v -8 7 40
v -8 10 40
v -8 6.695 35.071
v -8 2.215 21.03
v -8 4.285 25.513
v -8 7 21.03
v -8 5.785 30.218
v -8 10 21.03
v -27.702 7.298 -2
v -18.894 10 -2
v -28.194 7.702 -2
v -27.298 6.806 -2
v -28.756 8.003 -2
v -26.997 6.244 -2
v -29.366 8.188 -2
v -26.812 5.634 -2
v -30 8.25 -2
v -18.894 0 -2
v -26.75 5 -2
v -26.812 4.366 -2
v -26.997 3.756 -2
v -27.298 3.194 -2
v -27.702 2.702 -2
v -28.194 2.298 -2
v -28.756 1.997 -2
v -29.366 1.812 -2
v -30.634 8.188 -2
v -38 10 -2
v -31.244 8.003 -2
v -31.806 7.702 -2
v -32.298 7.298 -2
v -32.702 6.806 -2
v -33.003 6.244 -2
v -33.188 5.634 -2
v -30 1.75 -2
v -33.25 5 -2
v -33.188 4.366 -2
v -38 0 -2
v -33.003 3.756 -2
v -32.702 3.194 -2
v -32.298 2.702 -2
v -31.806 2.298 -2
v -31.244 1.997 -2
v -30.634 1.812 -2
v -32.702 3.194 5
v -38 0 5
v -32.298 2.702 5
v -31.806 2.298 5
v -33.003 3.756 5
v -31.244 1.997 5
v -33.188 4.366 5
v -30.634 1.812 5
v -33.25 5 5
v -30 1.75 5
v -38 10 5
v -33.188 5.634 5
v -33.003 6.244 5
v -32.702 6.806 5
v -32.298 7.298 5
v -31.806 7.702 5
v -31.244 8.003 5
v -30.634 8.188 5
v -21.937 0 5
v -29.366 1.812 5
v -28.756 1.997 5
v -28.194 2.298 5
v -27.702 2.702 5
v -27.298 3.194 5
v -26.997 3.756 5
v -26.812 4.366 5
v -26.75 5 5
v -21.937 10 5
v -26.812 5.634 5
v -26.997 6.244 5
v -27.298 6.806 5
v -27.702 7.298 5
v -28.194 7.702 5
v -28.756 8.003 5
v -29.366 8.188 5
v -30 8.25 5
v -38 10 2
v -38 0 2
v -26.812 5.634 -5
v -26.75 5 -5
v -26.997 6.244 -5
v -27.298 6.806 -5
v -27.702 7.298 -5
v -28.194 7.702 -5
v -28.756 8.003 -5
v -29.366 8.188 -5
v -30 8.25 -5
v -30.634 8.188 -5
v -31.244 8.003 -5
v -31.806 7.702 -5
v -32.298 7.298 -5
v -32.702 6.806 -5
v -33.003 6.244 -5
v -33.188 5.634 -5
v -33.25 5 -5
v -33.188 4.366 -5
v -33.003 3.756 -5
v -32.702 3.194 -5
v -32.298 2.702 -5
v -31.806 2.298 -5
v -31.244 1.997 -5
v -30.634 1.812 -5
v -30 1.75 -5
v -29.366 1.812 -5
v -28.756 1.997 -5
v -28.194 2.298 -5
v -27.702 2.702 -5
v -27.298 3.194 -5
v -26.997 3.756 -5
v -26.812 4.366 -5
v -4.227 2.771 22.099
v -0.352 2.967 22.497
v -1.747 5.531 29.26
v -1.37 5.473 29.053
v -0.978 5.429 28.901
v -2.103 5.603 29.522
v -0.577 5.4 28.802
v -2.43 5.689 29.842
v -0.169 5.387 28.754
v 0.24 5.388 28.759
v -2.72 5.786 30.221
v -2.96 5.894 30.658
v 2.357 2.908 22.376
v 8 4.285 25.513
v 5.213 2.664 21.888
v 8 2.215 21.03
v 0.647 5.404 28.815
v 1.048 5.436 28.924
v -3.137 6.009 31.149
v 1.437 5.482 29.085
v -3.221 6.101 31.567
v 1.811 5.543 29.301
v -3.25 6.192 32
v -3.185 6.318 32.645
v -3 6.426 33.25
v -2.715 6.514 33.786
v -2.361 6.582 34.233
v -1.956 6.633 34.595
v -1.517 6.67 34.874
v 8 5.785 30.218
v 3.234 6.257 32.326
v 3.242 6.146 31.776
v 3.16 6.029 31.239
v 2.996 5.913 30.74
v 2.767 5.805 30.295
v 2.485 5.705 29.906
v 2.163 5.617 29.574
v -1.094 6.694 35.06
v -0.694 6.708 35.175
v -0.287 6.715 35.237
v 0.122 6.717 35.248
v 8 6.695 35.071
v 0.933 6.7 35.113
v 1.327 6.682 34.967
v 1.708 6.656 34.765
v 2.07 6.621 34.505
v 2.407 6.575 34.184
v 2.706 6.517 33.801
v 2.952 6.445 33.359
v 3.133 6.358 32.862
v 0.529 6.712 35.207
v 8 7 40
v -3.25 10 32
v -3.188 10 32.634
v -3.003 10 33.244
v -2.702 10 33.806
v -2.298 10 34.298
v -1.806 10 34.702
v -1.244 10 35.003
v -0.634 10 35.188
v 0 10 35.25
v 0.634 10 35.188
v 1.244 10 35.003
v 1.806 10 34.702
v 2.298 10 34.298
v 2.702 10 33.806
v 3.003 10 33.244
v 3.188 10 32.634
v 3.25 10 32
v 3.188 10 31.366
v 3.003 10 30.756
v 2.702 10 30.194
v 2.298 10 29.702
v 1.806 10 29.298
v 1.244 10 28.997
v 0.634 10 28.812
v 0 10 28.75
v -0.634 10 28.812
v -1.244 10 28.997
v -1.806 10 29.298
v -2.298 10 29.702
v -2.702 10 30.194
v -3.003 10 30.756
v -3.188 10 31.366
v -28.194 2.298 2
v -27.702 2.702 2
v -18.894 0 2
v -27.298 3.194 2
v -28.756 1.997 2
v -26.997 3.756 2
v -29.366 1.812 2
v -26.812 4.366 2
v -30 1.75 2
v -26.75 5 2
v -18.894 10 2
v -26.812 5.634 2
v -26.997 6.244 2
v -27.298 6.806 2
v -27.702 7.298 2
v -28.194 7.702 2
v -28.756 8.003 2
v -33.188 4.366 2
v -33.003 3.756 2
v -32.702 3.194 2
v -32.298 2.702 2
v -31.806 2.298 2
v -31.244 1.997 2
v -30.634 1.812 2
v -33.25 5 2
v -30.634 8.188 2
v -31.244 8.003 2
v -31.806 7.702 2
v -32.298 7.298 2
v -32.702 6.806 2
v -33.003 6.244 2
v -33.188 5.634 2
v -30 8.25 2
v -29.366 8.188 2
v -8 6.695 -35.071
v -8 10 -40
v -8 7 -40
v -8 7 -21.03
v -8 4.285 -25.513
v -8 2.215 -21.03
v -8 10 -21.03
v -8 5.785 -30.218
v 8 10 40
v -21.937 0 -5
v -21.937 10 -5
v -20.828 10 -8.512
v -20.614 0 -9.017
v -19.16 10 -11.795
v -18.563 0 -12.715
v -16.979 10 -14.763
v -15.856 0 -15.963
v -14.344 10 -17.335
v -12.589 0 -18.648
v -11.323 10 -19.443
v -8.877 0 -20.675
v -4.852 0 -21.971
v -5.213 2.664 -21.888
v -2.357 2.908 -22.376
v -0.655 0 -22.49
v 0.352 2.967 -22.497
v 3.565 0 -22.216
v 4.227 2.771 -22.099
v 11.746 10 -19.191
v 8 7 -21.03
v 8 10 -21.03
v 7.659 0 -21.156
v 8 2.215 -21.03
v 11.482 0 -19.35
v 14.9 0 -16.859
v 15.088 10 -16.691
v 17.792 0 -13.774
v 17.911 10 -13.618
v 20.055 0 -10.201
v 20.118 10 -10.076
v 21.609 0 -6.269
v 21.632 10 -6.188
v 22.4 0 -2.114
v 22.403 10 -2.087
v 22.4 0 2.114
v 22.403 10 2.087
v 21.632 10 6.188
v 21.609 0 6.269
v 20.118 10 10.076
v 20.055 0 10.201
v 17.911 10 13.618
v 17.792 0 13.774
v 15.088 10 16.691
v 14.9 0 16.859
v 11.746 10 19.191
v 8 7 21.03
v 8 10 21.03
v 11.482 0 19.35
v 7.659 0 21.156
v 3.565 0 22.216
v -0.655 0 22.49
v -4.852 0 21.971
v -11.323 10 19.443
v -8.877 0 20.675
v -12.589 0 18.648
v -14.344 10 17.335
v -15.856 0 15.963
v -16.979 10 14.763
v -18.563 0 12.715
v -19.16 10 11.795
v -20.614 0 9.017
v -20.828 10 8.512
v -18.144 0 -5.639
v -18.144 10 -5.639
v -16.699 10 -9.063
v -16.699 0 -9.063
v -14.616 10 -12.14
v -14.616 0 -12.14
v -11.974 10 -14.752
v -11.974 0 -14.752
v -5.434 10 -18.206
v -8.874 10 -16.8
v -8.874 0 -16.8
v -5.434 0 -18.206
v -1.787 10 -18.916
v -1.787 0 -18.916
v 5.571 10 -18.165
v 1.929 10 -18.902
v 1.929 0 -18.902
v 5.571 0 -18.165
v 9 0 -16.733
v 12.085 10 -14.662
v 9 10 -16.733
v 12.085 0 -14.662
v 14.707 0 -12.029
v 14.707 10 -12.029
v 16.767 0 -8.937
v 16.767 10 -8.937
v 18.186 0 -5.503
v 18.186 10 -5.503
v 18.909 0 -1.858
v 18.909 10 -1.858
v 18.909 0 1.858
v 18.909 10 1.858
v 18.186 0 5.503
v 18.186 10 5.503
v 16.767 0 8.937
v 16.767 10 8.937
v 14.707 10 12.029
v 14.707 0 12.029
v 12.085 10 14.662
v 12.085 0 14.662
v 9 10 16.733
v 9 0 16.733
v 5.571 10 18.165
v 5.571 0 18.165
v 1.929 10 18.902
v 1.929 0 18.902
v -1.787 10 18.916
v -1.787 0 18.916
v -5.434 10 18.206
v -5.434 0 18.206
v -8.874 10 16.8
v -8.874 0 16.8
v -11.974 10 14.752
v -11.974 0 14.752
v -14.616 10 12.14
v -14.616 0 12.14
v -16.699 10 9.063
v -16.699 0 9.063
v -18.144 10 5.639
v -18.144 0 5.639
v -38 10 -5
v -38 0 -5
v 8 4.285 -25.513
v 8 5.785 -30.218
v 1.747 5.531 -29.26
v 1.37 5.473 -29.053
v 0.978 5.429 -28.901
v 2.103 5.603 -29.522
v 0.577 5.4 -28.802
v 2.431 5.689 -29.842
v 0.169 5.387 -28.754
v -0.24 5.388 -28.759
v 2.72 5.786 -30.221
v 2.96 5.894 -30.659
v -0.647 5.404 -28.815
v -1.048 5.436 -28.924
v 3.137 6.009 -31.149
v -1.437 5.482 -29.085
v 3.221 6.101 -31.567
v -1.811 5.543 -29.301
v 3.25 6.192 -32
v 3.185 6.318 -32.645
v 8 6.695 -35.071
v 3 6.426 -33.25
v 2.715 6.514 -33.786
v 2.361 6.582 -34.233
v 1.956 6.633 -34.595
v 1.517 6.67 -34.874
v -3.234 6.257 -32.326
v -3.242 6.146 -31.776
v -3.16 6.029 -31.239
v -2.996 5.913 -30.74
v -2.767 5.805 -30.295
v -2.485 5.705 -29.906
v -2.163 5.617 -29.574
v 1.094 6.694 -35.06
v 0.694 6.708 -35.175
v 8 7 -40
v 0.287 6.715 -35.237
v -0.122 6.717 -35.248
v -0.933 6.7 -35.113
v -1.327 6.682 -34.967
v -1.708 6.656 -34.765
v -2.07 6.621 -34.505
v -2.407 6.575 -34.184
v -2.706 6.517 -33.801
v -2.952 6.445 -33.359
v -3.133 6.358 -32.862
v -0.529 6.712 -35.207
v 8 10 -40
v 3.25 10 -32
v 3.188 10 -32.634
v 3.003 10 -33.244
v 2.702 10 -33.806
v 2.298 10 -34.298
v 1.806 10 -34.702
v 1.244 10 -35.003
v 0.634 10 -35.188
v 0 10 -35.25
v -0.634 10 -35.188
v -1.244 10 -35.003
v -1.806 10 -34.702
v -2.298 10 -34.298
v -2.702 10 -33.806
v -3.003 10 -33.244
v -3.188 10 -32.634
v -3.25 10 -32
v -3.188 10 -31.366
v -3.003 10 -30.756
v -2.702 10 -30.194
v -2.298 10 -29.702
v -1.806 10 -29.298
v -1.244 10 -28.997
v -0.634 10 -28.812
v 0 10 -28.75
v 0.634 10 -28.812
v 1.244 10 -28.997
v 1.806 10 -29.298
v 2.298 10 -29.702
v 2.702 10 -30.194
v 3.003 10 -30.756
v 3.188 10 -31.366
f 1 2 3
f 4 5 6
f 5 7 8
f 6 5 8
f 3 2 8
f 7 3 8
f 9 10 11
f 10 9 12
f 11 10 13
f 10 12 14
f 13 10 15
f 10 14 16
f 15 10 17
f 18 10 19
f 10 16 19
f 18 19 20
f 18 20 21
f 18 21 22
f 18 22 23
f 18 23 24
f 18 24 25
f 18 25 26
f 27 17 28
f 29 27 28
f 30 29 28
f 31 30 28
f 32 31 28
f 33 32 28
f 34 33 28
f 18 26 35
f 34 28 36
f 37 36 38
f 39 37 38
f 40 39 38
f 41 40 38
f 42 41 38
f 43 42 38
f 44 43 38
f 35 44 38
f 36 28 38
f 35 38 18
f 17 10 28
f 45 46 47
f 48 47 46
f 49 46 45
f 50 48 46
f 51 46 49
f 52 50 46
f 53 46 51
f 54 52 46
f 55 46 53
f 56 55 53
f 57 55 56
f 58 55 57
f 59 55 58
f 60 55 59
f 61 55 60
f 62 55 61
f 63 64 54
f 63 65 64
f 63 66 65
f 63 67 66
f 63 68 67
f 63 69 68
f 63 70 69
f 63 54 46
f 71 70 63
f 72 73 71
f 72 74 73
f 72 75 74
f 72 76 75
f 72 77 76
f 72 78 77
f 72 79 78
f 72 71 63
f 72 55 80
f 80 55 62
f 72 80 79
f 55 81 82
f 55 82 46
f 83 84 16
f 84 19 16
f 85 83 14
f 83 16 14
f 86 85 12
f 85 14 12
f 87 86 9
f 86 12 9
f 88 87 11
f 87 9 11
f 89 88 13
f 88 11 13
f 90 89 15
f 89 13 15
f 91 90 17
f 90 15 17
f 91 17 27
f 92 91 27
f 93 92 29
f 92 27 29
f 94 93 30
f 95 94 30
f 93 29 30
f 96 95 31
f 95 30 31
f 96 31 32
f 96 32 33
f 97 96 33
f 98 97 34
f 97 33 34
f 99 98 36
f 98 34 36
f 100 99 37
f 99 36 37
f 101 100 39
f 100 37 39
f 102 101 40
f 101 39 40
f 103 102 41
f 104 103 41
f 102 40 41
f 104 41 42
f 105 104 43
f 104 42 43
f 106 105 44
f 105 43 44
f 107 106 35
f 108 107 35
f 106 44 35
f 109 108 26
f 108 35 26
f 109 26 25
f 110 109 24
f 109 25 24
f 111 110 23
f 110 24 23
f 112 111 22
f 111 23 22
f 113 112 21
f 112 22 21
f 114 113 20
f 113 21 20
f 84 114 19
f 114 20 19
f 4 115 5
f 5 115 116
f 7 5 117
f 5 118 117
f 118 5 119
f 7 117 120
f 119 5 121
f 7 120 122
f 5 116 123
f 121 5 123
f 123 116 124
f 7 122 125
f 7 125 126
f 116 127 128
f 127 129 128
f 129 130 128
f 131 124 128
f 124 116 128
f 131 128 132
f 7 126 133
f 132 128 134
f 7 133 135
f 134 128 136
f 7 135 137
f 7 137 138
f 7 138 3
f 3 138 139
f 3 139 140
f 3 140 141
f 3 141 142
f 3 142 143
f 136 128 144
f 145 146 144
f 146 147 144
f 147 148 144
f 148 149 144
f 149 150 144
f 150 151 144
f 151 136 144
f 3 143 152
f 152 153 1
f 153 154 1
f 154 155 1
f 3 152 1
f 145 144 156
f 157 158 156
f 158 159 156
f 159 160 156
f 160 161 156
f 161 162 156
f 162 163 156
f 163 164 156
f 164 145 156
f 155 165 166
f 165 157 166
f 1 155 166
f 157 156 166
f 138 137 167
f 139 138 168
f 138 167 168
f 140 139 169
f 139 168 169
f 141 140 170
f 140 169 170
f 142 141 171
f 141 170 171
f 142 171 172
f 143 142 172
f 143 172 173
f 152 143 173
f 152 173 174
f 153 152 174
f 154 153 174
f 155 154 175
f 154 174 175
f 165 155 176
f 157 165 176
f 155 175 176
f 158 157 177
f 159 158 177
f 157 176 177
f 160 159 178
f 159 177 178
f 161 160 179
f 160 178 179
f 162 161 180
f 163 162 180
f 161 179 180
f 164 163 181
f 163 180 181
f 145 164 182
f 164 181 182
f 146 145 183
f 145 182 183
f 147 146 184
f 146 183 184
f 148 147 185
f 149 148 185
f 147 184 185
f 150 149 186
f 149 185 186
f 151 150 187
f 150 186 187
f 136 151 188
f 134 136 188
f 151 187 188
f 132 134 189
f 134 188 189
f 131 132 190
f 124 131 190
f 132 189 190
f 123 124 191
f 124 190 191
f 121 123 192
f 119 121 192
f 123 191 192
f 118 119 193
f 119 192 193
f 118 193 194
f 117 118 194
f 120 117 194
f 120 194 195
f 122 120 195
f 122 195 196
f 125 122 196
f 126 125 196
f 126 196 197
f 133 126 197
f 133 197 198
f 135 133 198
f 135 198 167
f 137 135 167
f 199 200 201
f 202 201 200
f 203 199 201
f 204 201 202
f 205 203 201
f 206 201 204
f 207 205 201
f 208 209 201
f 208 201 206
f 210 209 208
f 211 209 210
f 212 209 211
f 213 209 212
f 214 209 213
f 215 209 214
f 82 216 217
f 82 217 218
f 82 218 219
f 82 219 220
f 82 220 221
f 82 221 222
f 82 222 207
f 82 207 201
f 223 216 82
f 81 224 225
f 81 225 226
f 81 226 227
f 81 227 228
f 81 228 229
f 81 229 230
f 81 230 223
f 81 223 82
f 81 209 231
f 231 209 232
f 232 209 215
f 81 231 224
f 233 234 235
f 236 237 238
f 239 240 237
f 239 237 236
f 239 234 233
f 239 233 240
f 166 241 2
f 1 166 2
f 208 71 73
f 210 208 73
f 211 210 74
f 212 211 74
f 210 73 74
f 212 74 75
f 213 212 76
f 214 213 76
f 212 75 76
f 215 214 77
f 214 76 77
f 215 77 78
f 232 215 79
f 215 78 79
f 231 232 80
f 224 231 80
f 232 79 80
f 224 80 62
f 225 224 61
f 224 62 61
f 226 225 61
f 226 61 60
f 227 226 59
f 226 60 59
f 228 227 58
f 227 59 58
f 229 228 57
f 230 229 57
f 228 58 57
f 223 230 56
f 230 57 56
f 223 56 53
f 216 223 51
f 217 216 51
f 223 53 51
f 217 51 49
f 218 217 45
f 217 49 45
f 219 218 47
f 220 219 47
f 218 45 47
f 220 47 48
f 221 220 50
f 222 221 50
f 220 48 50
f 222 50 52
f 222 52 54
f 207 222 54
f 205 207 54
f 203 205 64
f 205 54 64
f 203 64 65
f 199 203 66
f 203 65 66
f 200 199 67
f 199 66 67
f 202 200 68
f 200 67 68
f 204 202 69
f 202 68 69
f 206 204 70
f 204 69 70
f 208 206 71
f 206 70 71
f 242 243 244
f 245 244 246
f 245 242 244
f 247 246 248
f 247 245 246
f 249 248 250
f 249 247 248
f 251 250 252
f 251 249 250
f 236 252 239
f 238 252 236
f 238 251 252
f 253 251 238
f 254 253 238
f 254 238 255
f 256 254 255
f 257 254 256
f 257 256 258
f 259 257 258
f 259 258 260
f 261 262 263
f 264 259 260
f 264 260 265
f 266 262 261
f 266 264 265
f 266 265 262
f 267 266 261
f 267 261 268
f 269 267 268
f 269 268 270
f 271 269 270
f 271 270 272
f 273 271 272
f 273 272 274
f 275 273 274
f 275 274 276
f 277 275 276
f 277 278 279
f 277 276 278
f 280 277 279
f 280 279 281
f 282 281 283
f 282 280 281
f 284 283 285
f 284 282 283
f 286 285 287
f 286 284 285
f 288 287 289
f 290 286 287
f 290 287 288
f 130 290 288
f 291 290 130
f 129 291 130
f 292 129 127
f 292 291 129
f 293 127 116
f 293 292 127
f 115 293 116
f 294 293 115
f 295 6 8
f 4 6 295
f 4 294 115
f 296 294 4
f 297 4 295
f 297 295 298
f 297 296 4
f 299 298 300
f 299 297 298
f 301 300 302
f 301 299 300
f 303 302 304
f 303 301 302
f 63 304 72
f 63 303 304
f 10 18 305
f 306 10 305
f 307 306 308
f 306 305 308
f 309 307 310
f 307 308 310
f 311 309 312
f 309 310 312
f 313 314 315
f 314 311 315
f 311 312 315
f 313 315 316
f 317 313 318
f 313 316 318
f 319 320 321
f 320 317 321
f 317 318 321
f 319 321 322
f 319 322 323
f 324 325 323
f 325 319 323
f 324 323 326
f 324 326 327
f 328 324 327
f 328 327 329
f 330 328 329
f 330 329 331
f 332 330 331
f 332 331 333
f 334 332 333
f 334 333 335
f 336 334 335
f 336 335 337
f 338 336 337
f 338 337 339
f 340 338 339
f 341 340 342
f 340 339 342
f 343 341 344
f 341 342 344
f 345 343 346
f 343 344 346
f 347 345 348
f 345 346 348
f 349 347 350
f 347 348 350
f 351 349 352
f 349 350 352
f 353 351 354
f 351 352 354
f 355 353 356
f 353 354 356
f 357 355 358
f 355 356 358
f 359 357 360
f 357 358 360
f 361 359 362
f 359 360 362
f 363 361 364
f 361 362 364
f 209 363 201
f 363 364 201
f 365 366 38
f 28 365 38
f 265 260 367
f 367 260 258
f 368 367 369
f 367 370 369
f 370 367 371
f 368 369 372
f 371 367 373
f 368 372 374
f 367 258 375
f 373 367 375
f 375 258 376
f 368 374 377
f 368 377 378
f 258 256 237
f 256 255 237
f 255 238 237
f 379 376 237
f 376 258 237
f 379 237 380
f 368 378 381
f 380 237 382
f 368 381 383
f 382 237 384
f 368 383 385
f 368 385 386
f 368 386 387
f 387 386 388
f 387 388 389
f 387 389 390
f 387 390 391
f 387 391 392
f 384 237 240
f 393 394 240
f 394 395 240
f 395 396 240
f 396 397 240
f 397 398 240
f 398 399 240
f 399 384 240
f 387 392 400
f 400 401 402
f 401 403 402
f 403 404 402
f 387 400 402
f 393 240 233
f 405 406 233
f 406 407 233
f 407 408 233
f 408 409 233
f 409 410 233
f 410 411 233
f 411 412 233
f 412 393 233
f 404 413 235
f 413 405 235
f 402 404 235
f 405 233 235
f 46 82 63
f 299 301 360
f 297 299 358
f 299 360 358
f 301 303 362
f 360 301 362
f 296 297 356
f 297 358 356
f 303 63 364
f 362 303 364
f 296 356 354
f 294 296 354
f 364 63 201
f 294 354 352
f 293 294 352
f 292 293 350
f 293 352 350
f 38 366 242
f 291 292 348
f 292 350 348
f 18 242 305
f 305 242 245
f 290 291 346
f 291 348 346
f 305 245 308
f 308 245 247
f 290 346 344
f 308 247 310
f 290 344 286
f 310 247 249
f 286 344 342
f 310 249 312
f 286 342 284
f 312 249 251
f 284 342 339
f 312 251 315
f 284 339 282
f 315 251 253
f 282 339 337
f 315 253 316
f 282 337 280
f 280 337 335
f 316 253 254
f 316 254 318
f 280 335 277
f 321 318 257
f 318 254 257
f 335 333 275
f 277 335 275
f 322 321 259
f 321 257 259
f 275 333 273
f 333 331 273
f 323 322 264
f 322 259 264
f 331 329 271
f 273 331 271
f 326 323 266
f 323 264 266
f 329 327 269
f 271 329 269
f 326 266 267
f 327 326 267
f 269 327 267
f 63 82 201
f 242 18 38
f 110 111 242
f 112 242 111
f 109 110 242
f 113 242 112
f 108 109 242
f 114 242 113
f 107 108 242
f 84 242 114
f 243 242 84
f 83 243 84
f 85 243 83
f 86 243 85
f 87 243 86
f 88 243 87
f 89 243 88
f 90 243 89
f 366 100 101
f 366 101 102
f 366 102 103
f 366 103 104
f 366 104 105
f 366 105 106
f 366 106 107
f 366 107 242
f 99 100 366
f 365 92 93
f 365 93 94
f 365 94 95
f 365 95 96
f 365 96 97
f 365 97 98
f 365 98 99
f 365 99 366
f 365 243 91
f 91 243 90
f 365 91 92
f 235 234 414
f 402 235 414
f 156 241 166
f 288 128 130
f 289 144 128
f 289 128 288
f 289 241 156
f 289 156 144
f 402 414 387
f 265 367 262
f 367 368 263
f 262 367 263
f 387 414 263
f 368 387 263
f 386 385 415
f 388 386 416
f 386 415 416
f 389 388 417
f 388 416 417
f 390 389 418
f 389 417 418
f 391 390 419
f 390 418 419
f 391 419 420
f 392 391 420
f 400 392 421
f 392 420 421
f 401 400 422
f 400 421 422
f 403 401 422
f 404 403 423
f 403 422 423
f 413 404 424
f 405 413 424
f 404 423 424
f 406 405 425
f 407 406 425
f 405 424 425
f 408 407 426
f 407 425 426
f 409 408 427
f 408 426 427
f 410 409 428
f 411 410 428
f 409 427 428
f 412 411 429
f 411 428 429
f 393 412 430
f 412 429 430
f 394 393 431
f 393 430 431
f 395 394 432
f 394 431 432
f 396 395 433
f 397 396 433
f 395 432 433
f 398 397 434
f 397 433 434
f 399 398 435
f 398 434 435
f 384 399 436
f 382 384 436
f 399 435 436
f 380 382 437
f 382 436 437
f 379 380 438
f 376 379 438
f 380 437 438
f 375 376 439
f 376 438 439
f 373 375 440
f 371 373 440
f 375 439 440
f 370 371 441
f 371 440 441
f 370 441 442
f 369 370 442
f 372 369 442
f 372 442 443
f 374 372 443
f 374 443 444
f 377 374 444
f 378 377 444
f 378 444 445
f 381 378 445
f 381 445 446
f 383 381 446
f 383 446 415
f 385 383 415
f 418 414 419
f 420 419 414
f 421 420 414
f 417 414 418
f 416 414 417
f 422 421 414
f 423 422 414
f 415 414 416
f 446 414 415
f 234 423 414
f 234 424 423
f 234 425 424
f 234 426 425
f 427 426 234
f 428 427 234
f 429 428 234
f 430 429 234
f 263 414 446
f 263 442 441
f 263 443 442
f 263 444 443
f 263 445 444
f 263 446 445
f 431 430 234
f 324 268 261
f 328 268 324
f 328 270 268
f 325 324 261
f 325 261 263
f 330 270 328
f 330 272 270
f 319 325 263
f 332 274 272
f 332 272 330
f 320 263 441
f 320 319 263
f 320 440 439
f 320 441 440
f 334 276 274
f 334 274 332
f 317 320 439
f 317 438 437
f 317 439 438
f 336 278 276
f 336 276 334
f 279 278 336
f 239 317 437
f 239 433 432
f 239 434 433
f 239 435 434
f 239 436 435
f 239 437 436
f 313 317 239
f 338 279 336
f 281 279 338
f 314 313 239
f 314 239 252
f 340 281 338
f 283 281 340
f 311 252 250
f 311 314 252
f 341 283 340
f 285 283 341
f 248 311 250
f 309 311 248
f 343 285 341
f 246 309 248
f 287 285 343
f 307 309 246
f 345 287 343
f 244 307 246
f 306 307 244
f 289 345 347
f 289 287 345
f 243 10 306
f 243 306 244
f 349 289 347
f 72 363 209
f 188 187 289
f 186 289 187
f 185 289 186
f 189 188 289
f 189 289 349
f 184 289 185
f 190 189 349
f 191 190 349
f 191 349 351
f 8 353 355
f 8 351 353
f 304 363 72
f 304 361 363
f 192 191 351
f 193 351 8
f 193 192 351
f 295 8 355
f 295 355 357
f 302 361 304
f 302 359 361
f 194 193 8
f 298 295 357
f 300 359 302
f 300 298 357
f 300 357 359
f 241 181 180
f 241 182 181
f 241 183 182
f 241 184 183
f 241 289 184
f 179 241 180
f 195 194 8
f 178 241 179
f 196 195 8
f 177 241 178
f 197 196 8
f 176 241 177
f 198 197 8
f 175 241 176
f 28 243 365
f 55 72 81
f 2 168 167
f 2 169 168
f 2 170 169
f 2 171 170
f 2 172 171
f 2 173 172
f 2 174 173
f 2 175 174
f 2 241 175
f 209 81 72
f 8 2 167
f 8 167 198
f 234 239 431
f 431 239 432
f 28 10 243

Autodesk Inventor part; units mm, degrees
ref_plane "YZ Plane" through (0, 0, 0) normal (1, 0, 0) x (0, 1, 0)
ref_plane "XZ Plane" through (0, 0, 0) normal (0, 1, 0) x (-1, 0, 0)
ref_plane "XY Plane" through (0, 0, 0) normal (0, 0, 1) x (1, 0, 0)
sketch "Sketch1" plane through (0, 0, 0) normal (0, 1, 0) x (-1, 0, 0)
  circle A0 centre (0, 0) radius 22.5
  circle A1 centre (0, 0) radius 19
  dimension "d0" = 45
  dimension "d1" = 38
extrude "Extrusion1" add sketch "Sketch1" along normal blind 10
sketch "Sketch2" plane through (0, 10, 0) normal (0, 1, 0) x (1, 0, 0)
  circle A0 centre (0, 0) radius 22.5 projected
  line L0 (0, -22.5) -> (0, 22.5) construction
  circle A1 centre (0, 0) radius 19 projected
  line L1 (-19, 0) -> (19, 0) construction
sketch "Sketch3" plane through (0, 10, 0) normal (0, 1, 0) x (1, 0, 0)
  line L0 (-8, -20) -> (8, -20)
  line L1 (8, -20) -> (8, -40)
  line L2 (8, -40) -> (-8, -40)
  line L3 (-8, -40) -> (-8, -20)
  point P0 (0, 0)
  dimension "d4" = 16
  dimension "d5" = 20
  dimension "d6" = 20
  dimension "d7" = 8
extrude "Extrusion2" add sketch "Sketch3" against normal blind 3
pattern_circular "Circular Pattern1" count 2 over 360 about axis through (0, 0, 0) along (0, 1, 0) of "Extrusion2"
sketch "Sketch4" plane through (0, 10, 0) normal (0, 1, 0) x (1, 0, 0)
  point P0 (0, 0)
sketch "Sketch6" plane through (0, 10, 0) normal (0, 1, 0) x (1, 0, 0)
  line L0 (-20, 5) -> (-38, 5)
  line L1 (-38, 5) -> (-38, 2)
  line L2 (-38, 2) -> (-20, 2)
  line L3 (-20, 2) -> (-20, 5)
  point P0 (0, 0)
  dimension "d14" = 18
  dimension "d15" = 3
  dimension "d16" = 20
  dimension "d17" = 2
extrude "Extrusion3" add sketch "Sketch6" against normal blind 10
pattern_linear "Rectangular Pattern1" count 2 spacing 7 along (0, 0, 1) of "Extrusion3"
sketch "Sketch7" plane through (-38, 10, 2) normal (-1, 0, 0) x (0, 0, 1)
  line L0 (0, 0) -> (0, -10) projected
  line L1 (-4, 0) -> (-4, -10) projected
  line L2 (0, -10) -> (-4, -10)
  line L3 (-4, -10) -> (-4, 0)
  line L4 (-4, 0) -> (0, 0)
  line L5 (0, 0) -> (0, -10)
  point P0 (-2, -10)
extrude "Extrusion4" cut sketch "Sketch7" against normal blind 20
sketch "Sketch9" plane through (0, 7, 0) normal (0, -1, 0) x (1, 0, 0)
  point P0 (0, 0)
sketch "Sketch10" plane through (0, 7, 0) normal (0, -1, 0) x (1, 0, 0)
  point P0 (0, 0)
sketch "Sketch11" plane through (8, 10, -40) normal (0, 0, -1) x (-1, 0, 0)
  point P0 (8, -10)
sketch "Sketch13" plane through (-8, 10, -40) normal (-1, 0, 0) x (0, 0, 1)
  point P0 (40, -10)
sketch "Sketch14" plane through (-38, 10, 5) normal (0, 0, 1) x (1, 0, 0)
  circle A0 centre (8, -5) radius 3.25
  line L0 (0, 0) -> (0, -10) projected
  line L1 (16.0626, -10) -> (0, -10) projected
  point P0 (38, -10)
  dimension "d27" = 6.5
  dimension "d28" = 8
  dimension "d29" = 5
extrude "Extrusion5" cut sketch "Sketch14" against normal blind 20
sketch "Sketch17" plane through (0, 0, 0) normal (0, -1, 0) x (1, 0, 0)
  arc A0 (-21.9374, -5) -> (-8, -21.0297) centre (0, 0) ccw projected
  line L0 (-8, -21.0297) -> (-8, -17.2337) construction
  arc A1 (-18.8944, -2) -> (-18.8944, 2) centre (0, 0) ccw projected
sketch "Sketch21" plane through (-8, 10, -40) normal (-1, 0, 0) x (0, 0, 1)
  line L0 (0, -43) -> (18, -10) construction
  line L1 (62.5, -10) -> (17.5, -10) projected
  line L2 (18.9703, -3) -> (0, -3) projected
  line L3 (0, 0) -> (0, -3) projected
  circle A0 centre (0, -43) radius 40
  line L4 (18.9703, -3) -> (18.9703, -10)
  point P0 (40, -10)
  point P1 (45, -10)
  point P2 (35, -10)
  point P3 (18.9703, -7.7845)
  dimension "d33" = 40
  dimension "d34" = 0
  dimension "d35" = 18
extrude "Extrusion6" add sketch "Sketch21" against normal blind 16 contours A0 L2 L4
sketch "Sketch22" plane through (0, 10, 0) normal (0, 1, 0) x (1, 0, 0)
  circle A0 centre (0, 32) radius 3.25
  line L0 (8, 40) -> (-8, 40) projected
  point P0 (0, 0)
  dimension "d38" = 6.5
  dimension "d39" = 8
extrude "Extrusion7" cut sketch "Sketch22" against normal blind 16
pattern_circular "Circular Pattern2" count 2 over 360 about axis through (0, 0, 0) along (0, 1, 0) of "Extrusion7", "Extrusion6"
properties part number "motor holder" material "ABS Plastic"
